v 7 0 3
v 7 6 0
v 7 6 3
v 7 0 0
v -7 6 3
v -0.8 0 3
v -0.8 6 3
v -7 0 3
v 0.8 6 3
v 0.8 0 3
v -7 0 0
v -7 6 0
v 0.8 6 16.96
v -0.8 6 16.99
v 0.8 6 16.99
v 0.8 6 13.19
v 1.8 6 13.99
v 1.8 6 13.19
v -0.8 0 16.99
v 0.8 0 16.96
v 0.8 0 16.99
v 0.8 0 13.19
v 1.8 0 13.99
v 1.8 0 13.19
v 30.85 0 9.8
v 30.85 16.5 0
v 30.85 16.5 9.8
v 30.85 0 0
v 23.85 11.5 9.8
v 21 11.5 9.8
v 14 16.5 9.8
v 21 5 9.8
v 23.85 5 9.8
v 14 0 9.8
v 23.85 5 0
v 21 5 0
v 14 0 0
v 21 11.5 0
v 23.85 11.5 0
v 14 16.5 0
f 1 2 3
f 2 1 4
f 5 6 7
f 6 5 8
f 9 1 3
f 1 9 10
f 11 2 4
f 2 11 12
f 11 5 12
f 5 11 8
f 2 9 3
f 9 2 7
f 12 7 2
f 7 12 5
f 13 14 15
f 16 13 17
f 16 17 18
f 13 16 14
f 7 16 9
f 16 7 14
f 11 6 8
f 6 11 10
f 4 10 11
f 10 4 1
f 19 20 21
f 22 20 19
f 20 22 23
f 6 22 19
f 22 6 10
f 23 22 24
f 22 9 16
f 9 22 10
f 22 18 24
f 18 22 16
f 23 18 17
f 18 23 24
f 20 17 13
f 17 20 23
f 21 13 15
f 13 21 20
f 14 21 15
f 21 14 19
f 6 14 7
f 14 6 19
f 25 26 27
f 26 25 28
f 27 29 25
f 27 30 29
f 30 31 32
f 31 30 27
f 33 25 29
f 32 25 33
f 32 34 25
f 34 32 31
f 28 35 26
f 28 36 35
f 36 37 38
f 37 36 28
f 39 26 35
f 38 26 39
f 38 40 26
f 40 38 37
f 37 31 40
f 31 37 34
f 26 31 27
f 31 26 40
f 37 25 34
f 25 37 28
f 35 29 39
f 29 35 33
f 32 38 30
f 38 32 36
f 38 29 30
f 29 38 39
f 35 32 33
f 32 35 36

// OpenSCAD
// ---------------------------------------------------------------
// snap_fit_test.scad  -  cantilever snap-fit clip and matching slot
// Used in: Level 3 exercise L3-5 (strain calculation), Level 2 exercise L2-14
//
// part = "clip"   : base block with a cantilever beam and a hook
// part = "socket" : plate with a rectangular slot the hook snaps through
// part = "both"   : both parts side by side
//
// Strain at the root of a rectangular cantilever deflected by h:
//     strain = 1.5 * h * t / L^2
// The script prints it with echo().  Keep it below the material's
// permissible strain (rough guide: PLA ~1.5 %, PETG ~3 %, nylon ~4 %+;
// always test, layer lines weaken the beam if they run across it).
// Orient the clip so layer lines run ALONG the beam (print the clip
// lying on its side, beam flat on the plate).
// Units: millimeters.
// ---------------------------------------------------------------

part       = "both";   // "clip", "socket" or "both"
beam_t     = 1.6;      // beam thickness in the bending direction (X)
beam_w     = 6;        // beam width (Y)
beam_l     = 14;       // free beam length (Z), from base to tip
hook_h     = 1.0;      // hook protrusion = beam deflection while snapping
hook_ramp  = 3;        // length of the lead-in ramp
hook_lip   = 0.8;      // thickness of the flat retaining face
base_t     = 3;        // thickness of the clip's base block
base_w     = 14;       // X size of the base block
clearance  = 0.25;     // gap around the beam in the slot
$fn        = 32;

// where the hook's retaining face sits above the base
catch_z   = beam_l - hook_ramp - hook_lip;
plate_t   = catch_z - 0.4;               // socket plate leaves a 0.4 mm play along Z
slot_x    = beam_t + hook_h + clearance; // room for the beam to bend inward
slot_y    = beam_w + 2 * clearance;

echo(str("Root strain = ", 150 * hook_h * beam_t / (beam_l * beam_l), " %"));

module clip() {
    // base block
    translate([-base_w / 2, 0, 0]) cube([base_w, beam_w, base_t]);
    // beam and hook, profile in X-Z extruded along Y
    translate([0, beam_w, base_t - 0.01])
        rotate([90, 0, 0])
            linear_extrude(beam_w)
                union() {
                    translate([-beam_t / 2, 0]) square([beam_t, beam_l]);
                    polygon([
                        [ beam_t / 2 - 0.01, beam_l],
                        [ beam_t / 2 + hook_h, beam_l - hook_ramp],
                        [ beam_t / 2 + hook_h, beam_l - hook_ramp - hook_lip],
                        [ beam_t / 2 - 0.01, beam_l - hook_ramp - hook_lip]
                    ]);
                }
}

module socket() {
    sw = slot_x + 14;       // plate width in X
    sl = slot_y + 10;       // plate length in Y
    difference() {
        cube([sw, sl, plate_t]);
        // slot: beam sits against its +X wall, free space on the -X side
        translate([(sw - slot_x) / 2, (sl - slot_y) / 2, -0.1])
            cube([slot_x, slot_y, plate_t + 0.2]);
    }
}

if (part == "clip" || part == "both") clip();
if (part == "socket") socket();
if (part == "both") translate([base_w, 0, 0]) socket();
